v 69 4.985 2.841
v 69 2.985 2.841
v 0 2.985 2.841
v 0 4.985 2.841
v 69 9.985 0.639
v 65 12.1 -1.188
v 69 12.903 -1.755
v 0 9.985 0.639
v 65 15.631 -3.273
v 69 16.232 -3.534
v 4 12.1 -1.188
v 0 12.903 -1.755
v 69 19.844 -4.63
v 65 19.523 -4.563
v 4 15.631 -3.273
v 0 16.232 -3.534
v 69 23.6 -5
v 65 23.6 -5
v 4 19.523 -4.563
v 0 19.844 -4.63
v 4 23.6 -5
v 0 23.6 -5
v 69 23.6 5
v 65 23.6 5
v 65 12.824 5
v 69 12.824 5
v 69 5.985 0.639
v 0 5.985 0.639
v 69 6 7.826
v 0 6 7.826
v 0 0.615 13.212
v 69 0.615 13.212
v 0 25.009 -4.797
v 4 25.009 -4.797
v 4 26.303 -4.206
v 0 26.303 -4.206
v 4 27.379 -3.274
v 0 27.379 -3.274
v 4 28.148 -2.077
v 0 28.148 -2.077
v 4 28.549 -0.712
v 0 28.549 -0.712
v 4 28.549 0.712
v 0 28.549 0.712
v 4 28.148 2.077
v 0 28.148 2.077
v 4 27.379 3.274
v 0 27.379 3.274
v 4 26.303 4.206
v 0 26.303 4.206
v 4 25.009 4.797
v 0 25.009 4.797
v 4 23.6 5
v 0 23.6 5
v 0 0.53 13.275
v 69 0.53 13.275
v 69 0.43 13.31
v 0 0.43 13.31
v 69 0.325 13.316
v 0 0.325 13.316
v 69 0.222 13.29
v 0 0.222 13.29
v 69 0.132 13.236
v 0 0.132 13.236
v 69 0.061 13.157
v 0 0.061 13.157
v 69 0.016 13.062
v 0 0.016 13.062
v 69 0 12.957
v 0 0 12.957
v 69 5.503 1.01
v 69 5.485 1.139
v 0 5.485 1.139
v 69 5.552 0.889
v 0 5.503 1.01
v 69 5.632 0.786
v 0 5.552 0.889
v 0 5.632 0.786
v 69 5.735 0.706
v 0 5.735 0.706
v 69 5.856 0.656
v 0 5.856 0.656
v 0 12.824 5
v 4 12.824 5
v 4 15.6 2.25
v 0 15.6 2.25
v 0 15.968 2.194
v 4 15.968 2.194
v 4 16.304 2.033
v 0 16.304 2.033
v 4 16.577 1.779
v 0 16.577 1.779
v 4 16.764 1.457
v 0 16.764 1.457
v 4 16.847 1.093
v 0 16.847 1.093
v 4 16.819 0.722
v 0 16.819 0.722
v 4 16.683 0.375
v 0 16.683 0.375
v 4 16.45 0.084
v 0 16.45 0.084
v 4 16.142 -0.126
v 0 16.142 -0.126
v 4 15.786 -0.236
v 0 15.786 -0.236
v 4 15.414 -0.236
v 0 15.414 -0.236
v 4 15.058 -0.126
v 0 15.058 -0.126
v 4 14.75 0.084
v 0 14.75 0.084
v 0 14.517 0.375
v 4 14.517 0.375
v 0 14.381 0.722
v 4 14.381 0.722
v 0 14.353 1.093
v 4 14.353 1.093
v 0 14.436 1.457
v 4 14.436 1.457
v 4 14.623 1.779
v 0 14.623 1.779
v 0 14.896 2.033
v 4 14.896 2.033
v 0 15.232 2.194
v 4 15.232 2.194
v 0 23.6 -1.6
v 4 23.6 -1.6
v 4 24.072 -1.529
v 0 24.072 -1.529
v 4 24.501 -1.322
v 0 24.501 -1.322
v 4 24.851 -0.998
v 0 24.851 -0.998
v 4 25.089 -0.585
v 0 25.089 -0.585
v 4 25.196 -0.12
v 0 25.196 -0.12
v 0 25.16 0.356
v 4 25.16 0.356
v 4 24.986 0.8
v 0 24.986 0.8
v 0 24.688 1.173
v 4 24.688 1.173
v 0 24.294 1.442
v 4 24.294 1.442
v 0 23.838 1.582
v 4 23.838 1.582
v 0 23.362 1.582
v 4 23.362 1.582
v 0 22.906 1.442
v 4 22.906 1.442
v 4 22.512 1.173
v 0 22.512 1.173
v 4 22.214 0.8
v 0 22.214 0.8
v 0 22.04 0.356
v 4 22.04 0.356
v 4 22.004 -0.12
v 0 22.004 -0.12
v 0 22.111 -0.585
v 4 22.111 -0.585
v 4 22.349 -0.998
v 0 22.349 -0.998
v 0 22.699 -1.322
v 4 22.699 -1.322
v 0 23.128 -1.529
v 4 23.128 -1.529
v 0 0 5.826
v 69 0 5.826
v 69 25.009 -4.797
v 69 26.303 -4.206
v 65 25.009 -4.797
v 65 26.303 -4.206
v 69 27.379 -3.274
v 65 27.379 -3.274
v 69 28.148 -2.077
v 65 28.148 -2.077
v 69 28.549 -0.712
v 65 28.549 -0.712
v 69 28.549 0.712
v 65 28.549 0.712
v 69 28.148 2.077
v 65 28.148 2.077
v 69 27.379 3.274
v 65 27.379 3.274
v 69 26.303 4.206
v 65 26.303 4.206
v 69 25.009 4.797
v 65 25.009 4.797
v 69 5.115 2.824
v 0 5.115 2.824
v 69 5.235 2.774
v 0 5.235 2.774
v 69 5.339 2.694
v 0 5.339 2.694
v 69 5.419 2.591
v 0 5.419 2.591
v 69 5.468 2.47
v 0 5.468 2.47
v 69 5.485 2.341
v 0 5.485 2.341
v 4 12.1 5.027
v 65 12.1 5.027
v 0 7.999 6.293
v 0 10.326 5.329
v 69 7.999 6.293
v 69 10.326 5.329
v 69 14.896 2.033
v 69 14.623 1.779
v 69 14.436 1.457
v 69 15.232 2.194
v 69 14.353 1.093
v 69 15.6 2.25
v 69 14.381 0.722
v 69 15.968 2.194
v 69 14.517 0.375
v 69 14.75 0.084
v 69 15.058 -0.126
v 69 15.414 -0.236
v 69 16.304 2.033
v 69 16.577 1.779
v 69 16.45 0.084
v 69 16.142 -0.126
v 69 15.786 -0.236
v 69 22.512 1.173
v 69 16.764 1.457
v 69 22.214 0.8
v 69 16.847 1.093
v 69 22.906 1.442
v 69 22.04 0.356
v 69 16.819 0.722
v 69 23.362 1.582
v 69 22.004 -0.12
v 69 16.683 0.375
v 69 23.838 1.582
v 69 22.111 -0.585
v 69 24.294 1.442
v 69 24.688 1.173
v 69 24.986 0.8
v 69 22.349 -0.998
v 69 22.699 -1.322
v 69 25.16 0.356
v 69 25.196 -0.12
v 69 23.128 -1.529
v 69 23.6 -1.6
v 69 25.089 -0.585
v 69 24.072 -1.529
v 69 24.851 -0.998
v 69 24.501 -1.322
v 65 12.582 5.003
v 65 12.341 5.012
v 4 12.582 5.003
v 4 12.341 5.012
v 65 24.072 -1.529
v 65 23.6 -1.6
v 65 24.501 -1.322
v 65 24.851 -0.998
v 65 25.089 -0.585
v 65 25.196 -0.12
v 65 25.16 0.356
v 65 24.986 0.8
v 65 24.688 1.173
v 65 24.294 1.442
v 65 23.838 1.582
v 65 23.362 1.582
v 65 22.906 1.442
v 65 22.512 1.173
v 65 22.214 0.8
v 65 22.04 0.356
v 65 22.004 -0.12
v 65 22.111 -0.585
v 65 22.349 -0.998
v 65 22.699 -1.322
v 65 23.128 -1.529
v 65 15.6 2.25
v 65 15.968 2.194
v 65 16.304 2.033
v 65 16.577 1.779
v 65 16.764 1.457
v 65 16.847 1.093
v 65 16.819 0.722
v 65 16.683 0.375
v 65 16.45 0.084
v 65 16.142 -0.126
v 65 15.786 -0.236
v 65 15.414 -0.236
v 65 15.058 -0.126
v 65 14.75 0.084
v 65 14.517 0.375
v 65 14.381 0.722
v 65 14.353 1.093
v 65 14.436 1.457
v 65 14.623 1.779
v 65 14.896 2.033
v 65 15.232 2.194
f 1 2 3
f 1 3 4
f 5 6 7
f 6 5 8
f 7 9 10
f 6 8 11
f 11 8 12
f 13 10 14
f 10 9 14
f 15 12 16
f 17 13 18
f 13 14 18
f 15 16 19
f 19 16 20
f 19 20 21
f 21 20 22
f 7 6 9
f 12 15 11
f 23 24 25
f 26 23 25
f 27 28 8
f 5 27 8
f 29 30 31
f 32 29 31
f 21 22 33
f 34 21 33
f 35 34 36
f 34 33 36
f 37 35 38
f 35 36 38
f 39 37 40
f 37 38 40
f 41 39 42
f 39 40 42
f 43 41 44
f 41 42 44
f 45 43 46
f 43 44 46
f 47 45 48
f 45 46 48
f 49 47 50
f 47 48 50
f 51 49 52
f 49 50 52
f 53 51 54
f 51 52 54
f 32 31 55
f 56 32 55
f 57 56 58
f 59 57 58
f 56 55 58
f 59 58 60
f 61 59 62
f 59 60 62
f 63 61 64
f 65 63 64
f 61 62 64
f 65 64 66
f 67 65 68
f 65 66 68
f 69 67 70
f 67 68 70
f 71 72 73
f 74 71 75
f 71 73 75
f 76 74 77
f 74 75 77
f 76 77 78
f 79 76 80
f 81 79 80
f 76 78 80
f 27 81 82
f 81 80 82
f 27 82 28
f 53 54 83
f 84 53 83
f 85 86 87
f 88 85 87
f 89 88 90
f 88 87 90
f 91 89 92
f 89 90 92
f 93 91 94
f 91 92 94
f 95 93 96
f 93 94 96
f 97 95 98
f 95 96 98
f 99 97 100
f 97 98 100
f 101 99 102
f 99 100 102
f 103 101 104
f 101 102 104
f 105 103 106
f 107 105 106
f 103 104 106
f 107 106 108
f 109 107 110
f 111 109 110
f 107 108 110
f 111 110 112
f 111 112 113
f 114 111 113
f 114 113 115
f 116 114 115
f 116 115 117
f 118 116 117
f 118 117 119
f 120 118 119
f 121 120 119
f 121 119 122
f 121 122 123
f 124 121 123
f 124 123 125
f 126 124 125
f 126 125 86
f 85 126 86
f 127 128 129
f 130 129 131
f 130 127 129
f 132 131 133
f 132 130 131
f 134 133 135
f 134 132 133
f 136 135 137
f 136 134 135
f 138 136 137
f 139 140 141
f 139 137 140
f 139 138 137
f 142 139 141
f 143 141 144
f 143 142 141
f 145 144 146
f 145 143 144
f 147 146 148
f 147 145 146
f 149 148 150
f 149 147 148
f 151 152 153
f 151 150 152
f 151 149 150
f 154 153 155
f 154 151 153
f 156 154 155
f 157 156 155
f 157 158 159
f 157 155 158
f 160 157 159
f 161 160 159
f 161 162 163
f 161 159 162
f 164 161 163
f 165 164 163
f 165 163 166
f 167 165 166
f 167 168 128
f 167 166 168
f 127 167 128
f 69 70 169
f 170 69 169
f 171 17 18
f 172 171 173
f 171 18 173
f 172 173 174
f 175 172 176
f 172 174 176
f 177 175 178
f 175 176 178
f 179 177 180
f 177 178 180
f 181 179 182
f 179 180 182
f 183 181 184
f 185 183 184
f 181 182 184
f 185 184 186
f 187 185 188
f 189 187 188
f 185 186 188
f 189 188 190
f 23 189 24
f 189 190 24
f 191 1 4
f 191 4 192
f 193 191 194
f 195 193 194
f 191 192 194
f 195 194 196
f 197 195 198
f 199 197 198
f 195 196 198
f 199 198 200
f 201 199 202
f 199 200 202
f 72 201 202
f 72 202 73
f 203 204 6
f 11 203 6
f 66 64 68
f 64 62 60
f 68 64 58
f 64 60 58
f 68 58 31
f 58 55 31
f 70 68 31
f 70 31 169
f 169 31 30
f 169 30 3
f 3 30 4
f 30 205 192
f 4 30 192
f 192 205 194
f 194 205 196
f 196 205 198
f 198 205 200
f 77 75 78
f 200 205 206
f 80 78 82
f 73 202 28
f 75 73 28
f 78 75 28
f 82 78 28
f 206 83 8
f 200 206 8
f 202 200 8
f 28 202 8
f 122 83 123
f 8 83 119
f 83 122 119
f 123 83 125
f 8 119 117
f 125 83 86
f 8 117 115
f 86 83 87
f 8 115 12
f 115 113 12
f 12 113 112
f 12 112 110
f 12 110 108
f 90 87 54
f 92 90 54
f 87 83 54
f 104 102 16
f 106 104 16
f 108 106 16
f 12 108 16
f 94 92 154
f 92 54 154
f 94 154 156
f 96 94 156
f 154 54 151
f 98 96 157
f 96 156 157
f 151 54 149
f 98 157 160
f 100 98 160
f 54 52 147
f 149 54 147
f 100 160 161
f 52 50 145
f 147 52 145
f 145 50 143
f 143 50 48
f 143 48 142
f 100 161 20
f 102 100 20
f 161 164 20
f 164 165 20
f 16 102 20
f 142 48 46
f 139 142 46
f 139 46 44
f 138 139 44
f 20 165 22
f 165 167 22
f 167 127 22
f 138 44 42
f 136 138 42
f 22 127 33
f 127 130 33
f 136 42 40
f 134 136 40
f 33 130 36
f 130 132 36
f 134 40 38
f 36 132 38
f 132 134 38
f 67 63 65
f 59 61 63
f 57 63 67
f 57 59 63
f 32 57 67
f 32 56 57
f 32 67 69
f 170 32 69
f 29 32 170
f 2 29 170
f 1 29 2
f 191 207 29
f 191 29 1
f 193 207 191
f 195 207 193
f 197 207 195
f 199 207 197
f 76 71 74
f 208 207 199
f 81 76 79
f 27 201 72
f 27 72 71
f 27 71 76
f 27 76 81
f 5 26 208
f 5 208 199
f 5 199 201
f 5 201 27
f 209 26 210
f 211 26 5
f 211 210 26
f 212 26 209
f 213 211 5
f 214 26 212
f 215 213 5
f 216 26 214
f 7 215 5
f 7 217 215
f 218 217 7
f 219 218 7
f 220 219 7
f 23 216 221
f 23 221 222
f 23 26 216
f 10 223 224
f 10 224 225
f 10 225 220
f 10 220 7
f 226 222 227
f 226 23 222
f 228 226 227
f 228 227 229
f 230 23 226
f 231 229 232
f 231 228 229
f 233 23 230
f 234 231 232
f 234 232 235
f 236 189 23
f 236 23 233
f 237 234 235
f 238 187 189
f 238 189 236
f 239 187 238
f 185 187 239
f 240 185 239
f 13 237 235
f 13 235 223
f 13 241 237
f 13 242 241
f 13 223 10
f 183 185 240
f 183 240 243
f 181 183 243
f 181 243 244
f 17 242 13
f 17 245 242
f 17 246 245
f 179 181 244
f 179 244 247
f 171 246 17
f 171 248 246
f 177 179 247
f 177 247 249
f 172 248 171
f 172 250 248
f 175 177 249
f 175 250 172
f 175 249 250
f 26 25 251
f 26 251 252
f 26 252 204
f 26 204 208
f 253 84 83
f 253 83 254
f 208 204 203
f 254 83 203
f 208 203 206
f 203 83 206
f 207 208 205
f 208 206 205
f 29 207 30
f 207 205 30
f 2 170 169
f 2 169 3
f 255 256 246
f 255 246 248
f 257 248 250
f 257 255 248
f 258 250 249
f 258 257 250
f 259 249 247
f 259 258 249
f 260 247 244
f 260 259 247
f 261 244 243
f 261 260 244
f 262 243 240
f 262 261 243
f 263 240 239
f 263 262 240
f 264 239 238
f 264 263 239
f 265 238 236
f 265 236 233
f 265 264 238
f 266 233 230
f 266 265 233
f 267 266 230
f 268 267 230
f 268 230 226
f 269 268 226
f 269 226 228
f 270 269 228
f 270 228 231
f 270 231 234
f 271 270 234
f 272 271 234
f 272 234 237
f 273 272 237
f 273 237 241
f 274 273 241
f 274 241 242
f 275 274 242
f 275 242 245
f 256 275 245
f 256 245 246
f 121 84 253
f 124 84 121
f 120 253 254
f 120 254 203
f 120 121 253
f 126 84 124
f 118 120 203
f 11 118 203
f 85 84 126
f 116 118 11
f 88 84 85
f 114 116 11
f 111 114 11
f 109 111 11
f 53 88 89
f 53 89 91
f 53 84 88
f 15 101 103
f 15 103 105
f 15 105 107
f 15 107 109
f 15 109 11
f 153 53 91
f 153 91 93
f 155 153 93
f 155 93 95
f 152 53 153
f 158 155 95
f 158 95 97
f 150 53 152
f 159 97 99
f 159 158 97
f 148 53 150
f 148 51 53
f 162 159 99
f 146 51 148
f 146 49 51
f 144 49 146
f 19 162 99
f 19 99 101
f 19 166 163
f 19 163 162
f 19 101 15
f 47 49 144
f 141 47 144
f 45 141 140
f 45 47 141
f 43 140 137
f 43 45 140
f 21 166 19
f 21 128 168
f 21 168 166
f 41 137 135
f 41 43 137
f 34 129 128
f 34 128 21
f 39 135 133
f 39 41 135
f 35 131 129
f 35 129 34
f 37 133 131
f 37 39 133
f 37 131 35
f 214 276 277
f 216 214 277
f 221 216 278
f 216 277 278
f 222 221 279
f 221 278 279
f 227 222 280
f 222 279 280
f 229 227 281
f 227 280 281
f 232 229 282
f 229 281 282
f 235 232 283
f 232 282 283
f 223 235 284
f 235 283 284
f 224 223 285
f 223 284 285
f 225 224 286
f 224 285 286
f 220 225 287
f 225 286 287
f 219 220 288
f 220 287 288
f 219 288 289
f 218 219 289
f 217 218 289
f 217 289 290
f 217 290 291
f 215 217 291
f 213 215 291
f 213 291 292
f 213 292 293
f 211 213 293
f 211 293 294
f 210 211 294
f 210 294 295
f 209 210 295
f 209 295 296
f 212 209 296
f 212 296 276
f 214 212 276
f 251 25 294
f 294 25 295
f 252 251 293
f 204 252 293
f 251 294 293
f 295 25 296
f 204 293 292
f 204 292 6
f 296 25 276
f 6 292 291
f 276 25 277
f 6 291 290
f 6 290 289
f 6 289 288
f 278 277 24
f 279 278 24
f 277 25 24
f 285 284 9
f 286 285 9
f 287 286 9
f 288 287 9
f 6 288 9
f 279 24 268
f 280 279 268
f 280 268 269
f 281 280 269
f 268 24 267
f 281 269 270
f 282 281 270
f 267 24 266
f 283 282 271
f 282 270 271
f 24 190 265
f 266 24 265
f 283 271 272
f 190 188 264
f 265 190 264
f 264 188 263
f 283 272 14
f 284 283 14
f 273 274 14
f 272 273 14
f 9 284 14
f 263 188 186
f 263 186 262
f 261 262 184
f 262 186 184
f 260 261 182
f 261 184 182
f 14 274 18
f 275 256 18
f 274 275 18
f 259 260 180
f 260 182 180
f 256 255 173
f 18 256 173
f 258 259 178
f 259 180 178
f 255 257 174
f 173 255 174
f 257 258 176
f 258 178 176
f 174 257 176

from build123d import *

# Parameters (mm, degrees)
SKETCH1_R               = 1.6
BOSS_EXTRUDE1_DEPTH     = 69
SKETCH2_W               = 21.169041722
SKETCH2_H               = 16.5
CUT_EXTRUDE1_DEPTH      = 61
TAP_DRILL_FOR_M3_TAP1_D = 2.5


with BuildPart() as part:
    # Sketch1 → Boss-Extrude1 (new body)
    with BuildSketch(Plane(origin=(0, 0, 0), x_dir=(0, 0, -1), z_dir=(1, 0, 0))):
        with BuildLine():
            Line((-5, 23.6), (-5, 12.823580437))
            ThreePointArc((-5, 12.823580437), (-5.734562511, 9.130685315), (-7.826419562, 5.999999999))
            Line((-7.826419562, 5.999999999), (-13.211861119, 0.614558441))
            ThreePointArc((-13.211861119, 0.614558441), (-13.28989931, 0.222233964), (-12.957302678, 0))
            Line((-12.957302678, 0), (-5.826419558, 0))
            Line((-5.826419558, 0), (-2.840921838, 2.98549772))
            Line((-2.840921838, 2.98549772), (-2.840921838, 4.98549772))
            ThreePointArc((-2.840921838, 4.98549772), (-2.694475228, 5.339051111), (-2.340921838, 5.48549772))
            Line((-2.340921838, 5.48549772), (-1.139311489, 5.48549772))
            ThreePointArc((-1.139311489, 5.48549772), (-0.785758099, 5.631944329), (-0.639311489, 5.98549772))
            Line((-0.639311489, 5.98549772), (-0.639311489, 9.98549772))
            ThreePointArc((-0.639311489, 9.98549772), (3.534390695, 16.231884461), (5, 23.6))
            ThreePointArc((5, 23.6), (0, 28.6), (-5, 23.6))
        make_face()
        with Locations((0, 23.6)):
            Circle(SKETCH1_R, mode=Mode.SUBTRACT)
    extrude(amount=BOSS_EXTRUDE1_DEPTH)

    # Sketch2 → Cut-Extrude1 (cut)
    with BuildSketch(Plane(origin=(4, 0, 0), x_dir=(0, 0, -1), z_dir=(1, 0, 0))):
        with Locations((-5.584520861, 20.35)):
            Rectangle(SKETCH2_W, SKETCH2_H)
    extrude(amount=CUT_EXTRUDE1_DEPTH, mode=Mode.SUBTRACT)

    # Tap Drill for M3 Tap1 (through all)
    with Locations(Plane(origin=(69, 0, 0), x_dir=(0, 0, -1), z_dir=(1, 0, 0))):
        with Locations((-1, 15.6)):
            Hole(TAP_DRILL_FOR_M3_TAP1_D / 2)


solid = part.part
